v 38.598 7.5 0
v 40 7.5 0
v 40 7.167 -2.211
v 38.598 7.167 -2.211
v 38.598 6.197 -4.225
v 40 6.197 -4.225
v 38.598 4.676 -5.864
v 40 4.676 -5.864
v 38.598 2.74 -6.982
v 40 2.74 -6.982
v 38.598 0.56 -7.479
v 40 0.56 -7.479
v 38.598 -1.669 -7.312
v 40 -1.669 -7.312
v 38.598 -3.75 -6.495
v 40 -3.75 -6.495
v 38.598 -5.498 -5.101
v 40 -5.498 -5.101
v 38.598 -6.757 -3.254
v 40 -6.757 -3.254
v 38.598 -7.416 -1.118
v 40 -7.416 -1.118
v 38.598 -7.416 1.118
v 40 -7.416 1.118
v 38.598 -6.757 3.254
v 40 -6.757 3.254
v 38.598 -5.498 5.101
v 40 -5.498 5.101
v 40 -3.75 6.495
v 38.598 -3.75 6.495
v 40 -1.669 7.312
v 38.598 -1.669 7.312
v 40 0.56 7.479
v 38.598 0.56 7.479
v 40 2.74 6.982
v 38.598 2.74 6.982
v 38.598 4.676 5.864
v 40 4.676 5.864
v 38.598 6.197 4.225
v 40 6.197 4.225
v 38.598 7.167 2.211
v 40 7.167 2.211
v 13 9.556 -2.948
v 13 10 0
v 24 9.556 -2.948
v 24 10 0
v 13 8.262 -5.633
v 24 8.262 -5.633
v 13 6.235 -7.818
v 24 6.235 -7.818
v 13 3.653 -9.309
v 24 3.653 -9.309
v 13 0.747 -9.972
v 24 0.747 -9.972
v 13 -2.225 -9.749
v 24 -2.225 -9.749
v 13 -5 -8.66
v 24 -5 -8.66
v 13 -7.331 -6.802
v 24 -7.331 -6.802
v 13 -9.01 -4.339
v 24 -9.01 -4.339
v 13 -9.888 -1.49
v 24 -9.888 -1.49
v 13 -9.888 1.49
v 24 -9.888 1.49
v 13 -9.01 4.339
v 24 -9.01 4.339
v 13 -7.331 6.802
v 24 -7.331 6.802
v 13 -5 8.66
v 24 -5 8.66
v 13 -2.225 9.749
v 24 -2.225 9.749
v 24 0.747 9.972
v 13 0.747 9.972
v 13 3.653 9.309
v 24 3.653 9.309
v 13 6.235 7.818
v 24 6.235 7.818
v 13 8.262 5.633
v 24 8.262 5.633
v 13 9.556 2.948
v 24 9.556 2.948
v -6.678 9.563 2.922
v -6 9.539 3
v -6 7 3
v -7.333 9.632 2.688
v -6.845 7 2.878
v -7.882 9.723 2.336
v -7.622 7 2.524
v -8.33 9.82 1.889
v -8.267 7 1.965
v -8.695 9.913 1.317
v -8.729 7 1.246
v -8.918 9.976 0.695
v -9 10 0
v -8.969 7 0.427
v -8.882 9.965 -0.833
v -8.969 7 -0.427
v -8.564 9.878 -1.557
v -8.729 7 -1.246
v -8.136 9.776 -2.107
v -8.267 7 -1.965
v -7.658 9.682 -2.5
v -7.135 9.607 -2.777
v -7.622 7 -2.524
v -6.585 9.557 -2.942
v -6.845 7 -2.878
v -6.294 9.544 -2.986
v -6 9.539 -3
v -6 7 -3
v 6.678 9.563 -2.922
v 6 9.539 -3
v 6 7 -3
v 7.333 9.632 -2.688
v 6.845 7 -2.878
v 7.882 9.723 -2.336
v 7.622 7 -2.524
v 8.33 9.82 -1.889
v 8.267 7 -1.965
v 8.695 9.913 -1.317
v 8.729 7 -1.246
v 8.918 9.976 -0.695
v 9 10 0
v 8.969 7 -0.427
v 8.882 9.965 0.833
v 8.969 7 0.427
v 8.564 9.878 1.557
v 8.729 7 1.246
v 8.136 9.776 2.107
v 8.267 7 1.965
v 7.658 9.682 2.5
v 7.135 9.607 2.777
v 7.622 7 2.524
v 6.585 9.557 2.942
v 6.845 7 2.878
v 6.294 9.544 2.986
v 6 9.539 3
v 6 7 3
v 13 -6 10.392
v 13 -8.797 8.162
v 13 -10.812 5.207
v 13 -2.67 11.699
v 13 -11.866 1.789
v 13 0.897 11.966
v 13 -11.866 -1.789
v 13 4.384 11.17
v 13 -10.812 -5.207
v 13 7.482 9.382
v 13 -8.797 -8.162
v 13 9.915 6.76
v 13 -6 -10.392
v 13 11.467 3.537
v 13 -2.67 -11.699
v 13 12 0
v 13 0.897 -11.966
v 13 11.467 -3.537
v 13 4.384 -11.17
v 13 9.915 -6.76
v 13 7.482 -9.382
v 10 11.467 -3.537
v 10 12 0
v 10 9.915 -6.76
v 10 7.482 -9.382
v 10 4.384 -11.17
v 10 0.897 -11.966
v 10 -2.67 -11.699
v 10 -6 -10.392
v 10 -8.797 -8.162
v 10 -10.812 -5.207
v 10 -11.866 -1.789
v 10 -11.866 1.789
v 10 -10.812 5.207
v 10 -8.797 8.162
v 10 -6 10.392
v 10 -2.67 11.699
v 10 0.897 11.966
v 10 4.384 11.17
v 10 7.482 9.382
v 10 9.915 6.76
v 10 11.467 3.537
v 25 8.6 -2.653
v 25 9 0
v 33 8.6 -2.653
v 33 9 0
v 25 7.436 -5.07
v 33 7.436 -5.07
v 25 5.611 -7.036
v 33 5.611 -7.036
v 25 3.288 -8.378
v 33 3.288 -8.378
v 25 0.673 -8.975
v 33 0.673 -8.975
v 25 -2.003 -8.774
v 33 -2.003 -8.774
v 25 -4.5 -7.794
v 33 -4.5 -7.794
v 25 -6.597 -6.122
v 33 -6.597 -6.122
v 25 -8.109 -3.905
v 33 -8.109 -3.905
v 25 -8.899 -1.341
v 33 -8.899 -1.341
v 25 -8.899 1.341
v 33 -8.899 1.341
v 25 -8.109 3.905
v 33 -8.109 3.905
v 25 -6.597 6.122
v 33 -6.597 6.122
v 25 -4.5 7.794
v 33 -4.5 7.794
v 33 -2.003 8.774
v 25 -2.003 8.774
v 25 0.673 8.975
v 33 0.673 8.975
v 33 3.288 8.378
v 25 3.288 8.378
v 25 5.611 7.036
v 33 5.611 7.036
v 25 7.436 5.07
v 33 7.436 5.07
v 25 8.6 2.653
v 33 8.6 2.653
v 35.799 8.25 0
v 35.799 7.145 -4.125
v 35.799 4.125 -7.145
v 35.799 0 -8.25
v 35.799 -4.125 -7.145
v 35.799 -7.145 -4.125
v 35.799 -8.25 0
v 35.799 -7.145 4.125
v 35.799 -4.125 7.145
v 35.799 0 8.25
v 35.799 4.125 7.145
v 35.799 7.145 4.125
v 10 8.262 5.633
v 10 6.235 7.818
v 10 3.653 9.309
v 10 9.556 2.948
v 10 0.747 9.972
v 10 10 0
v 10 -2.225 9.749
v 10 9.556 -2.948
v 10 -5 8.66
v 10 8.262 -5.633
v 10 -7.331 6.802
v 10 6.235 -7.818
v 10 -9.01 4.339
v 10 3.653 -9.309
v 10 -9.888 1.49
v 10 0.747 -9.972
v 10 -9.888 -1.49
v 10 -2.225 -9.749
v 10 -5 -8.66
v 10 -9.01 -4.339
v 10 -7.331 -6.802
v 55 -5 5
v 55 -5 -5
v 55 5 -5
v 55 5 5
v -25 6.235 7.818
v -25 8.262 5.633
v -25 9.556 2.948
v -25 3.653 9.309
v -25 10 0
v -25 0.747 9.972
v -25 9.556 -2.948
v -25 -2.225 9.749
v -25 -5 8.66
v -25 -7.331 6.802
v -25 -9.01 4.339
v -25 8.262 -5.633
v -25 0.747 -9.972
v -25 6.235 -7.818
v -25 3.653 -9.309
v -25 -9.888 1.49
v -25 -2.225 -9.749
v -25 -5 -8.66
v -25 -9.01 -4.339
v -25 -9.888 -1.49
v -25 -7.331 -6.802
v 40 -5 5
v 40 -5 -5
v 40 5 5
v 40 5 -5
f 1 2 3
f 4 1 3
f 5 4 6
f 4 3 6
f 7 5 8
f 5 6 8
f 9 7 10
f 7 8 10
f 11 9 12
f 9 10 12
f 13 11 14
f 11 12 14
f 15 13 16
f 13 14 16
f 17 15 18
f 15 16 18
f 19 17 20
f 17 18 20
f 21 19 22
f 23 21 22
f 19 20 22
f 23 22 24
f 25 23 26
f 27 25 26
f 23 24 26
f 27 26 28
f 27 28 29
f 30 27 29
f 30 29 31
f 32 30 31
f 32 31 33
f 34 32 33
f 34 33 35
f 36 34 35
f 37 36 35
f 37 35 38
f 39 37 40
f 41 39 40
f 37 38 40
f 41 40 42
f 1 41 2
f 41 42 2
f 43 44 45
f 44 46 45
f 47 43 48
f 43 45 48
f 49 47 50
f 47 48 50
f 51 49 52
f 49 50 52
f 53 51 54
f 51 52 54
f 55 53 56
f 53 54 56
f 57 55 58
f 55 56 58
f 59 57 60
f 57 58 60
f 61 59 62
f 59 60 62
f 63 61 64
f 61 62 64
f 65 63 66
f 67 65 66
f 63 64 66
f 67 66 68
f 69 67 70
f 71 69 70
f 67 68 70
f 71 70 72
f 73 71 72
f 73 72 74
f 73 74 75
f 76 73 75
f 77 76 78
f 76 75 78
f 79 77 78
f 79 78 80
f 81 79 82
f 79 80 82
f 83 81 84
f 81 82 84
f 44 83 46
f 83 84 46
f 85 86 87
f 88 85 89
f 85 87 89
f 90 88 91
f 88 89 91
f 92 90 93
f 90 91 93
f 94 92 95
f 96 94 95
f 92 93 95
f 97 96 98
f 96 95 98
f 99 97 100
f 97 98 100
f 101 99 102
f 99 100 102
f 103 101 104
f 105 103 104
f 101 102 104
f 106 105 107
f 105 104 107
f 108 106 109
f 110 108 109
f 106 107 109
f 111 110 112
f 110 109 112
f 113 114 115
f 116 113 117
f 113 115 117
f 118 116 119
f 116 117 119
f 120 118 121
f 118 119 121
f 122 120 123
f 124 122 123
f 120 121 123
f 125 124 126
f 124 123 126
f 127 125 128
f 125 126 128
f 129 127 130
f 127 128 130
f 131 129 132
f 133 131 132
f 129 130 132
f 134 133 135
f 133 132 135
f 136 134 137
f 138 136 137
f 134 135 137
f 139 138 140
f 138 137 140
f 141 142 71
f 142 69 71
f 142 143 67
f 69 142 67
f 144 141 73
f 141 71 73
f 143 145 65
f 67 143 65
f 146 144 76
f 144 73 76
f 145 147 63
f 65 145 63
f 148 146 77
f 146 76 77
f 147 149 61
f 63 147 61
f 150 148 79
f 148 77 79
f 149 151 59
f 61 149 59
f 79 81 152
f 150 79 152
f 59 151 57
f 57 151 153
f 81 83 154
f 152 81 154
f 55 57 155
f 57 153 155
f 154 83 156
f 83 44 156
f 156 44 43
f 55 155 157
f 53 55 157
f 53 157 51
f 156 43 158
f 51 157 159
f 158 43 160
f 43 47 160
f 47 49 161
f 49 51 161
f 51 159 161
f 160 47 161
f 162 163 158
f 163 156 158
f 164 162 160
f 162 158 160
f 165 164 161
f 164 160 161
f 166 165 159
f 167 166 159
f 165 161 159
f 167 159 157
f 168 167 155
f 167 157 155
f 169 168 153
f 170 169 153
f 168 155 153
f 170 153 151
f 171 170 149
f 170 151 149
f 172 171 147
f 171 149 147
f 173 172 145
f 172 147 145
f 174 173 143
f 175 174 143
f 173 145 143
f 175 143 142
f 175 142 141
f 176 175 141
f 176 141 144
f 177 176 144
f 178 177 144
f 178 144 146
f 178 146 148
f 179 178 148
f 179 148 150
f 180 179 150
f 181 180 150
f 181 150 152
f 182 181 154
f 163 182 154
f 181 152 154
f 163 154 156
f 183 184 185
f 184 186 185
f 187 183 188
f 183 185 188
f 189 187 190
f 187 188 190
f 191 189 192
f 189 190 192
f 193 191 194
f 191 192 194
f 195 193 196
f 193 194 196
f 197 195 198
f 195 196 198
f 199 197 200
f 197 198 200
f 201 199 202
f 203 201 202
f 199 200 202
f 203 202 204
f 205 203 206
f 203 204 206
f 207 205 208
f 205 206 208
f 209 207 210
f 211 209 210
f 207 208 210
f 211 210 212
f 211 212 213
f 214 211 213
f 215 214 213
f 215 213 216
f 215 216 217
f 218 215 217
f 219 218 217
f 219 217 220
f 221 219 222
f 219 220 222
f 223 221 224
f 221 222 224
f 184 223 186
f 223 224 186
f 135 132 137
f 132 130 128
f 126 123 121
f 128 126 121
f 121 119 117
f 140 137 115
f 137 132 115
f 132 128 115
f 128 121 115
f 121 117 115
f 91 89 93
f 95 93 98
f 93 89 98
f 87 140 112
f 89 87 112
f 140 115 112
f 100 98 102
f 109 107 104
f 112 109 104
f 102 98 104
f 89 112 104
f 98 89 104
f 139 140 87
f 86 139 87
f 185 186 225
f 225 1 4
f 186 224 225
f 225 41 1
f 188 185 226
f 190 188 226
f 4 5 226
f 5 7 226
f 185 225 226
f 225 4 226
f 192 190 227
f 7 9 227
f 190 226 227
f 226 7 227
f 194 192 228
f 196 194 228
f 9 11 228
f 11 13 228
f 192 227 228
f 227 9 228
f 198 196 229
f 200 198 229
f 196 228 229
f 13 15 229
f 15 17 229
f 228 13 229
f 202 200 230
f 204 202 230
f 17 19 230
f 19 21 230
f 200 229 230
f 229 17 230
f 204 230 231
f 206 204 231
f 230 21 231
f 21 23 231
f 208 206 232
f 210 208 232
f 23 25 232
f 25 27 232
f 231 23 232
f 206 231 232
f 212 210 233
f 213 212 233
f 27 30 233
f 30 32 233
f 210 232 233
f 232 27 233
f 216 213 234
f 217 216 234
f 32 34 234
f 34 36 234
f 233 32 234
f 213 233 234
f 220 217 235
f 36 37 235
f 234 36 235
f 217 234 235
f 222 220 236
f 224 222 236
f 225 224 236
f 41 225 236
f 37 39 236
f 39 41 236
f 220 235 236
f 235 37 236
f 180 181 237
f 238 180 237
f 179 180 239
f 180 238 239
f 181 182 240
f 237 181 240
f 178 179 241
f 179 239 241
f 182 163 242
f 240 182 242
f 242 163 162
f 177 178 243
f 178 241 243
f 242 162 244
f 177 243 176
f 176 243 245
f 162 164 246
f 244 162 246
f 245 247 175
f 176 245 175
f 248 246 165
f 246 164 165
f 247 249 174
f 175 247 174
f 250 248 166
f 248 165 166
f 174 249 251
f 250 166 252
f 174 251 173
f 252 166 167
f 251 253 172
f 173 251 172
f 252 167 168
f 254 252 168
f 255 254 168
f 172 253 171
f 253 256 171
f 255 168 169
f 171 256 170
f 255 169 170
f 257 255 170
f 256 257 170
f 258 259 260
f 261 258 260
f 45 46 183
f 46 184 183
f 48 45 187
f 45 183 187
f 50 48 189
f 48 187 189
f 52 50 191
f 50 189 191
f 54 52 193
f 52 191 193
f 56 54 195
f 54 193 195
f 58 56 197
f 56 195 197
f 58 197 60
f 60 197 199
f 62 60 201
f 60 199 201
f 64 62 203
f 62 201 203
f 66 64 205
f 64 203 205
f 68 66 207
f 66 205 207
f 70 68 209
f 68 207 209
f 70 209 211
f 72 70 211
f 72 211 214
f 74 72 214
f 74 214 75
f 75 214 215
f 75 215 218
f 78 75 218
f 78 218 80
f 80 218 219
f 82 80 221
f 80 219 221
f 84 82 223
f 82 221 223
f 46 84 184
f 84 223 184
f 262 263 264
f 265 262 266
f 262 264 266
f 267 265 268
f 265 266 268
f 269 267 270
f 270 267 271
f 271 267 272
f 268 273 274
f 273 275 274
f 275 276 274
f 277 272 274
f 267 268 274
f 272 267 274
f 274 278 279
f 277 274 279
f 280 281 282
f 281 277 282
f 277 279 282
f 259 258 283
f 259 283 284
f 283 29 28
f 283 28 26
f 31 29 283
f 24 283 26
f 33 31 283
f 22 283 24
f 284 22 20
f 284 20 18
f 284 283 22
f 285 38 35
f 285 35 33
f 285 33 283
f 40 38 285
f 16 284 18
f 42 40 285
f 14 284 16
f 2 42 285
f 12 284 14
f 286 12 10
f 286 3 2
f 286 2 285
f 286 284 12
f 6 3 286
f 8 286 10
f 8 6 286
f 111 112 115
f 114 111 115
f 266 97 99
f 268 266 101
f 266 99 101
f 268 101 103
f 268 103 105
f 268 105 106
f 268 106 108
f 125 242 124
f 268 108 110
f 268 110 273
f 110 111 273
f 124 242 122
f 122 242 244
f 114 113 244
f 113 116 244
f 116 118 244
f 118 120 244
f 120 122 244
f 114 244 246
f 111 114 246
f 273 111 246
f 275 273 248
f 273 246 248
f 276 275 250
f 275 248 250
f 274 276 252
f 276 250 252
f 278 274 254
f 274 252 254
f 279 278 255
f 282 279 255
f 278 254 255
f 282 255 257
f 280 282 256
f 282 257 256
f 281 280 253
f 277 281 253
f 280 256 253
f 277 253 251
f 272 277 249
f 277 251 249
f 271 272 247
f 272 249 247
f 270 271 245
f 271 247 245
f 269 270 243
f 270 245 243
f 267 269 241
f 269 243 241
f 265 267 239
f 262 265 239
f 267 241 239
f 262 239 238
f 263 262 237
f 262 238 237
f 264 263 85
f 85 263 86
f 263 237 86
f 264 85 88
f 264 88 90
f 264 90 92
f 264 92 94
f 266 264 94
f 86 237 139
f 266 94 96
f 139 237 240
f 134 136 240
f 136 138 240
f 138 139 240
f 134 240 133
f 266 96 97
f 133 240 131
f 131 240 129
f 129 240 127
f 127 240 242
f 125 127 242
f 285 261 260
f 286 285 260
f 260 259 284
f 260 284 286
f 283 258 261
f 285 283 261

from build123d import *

# Parameters (mm, degrees)
SKETCH_2_OUTSIDE_W   = 43.38
SKETCH_2_OUTSIDE_H   = 43.38
SKETCH_2_OUTSIDE_W_2 = 10
SKETCH_2_OUTSIDE_H_2 = 10
CUT_EXTRUDE_1_DEPTH  = 15
CUT_EXTRUDE_START    = 7
CUT_EXTRUDE_2_DEPTH  = 6


with BuildPart() as part:
    # Эскиз1 → Повернуть1 (revolve)
    with BuildSketch(Plane.XY):
        Polygon((-25, 10), (10, 10), (10, 12), (13, 12), (13, 10), (24, 10), (25, 9), (33, 9), (38.598076211, 7.5), (55, 7.5), (55, 0), (-25, 0), align=None)
    revolve(axis=Axis((0, 0, 0), (-1, 0, 0)))

    # Эскиз2 outside → Вырез-Вытянуть1 (cut)
    with BuildSketch(Plane(origin=(55, 0, 0), x_dir=(0, 0, -1), z_dir=(1, 0, 0))):
        Rectangle(SKETCH_2_OUTSIDE_W, SKETCH_2_OUTSIDE_H)
        Rectangle(SKETCH_2_OUTSIDE_W_2, SKETCH_2_OUTSIDE_H_2, mode=Mode.SUBTRACT)
    extrude(amount=-CUT_EXTRUDE_1_DEPTH, mode=Mode.SUBTRACT)

    # Эскиз3 → Вырез-Вытянуть2 (cut, through all)
    with BuildSketch(Plane(origin=(0, 0, 0), x_dir=(1, 0, 0), z_dir=(0, 1, 0)).offset(CUT_EXTRUDE_START)):
        with BuildLine():
            Line((-6, 3), (6, 3))
            ThreePointArc((6, 3), (9, 0), (6, -3))
            Line((6, -3), (-6, -3))
            ThreePointArc((-6, -3), (-9, 0), (-6, 3))
        make_face()
    extrude(amount=CUT_EXTRUDE_2_DEPTH, mode=Mode.SUBTRACT)


solid = part.part
